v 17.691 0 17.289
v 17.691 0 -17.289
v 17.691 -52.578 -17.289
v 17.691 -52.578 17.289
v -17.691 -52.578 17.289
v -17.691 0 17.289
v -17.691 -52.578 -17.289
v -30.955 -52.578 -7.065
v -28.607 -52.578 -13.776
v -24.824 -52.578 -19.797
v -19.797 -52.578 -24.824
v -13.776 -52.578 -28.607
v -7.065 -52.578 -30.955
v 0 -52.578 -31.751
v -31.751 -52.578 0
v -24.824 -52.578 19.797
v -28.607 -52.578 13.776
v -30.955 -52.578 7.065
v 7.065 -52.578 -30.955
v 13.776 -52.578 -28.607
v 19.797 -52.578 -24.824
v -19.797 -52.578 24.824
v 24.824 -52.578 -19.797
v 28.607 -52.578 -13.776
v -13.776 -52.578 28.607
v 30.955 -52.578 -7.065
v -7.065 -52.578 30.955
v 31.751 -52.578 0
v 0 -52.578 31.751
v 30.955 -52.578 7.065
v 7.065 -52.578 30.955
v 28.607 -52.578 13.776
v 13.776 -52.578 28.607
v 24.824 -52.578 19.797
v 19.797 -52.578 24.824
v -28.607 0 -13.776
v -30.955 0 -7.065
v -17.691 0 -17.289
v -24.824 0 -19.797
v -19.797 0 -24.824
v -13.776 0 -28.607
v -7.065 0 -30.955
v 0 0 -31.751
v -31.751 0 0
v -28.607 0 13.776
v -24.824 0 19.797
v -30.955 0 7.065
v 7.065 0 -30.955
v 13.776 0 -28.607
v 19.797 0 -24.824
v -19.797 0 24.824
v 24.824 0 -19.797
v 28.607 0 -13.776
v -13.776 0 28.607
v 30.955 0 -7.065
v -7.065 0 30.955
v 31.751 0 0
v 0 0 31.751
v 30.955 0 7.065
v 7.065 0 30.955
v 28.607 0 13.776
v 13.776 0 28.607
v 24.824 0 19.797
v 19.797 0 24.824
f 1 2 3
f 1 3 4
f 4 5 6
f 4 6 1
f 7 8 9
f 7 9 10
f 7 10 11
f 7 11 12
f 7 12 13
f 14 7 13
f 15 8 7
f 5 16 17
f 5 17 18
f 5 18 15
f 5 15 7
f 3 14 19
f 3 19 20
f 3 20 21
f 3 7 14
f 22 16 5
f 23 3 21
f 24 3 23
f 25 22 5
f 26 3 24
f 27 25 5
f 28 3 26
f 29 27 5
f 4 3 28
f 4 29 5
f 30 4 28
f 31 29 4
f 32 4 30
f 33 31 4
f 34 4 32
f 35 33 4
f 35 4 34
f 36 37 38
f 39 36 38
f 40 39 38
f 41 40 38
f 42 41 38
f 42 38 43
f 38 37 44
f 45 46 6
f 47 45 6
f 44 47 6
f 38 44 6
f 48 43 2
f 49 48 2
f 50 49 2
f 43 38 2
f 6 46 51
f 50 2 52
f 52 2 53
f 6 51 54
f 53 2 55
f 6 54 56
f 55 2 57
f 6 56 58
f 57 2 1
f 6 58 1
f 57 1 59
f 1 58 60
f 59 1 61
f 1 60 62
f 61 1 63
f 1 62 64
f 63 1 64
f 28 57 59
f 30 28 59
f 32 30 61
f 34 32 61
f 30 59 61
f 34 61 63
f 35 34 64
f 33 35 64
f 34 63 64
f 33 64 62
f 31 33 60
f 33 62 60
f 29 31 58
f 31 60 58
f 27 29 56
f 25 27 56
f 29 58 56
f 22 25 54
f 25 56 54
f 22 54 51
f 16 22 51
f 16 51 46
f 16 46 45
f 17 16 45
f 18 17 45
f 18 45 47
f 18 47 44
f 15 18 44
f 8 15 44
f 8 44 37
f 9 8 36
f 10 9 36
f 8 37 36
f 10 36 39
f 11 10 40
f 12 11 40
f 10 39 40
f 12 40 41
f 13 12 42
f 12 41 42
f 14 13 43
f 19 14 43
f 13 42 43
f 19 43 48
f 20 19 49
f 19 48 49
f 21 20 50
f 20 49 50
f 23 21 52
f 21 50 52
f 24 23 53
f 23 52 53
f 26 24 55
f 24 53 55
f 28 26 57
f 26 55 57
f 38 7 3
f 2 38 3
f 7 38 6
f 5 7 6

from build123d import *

# Parameters (mm, degrees)
F0_R     = 31.751454
F1_DEPTH = 52.578
F2_W     = 35.38131
F2_H     = 34.577188
F3_DEPTH = 141.478


with BuildPart() as f1:
    # F0 (on Front) → F1 (new body)
    with BuildSketch(Plane.XZ):
        Circle(F0_R)
    extrude(amount=F1_DEPTH)

    # F2 (on face) + F0 (on Front) → F3 (cut)
    with BuildSketch(Plane.XZ.offset(52.578)):
        Rectangle(F2_W, F2_H)
    with BuildSketch(Plane.XZ):
        Circle(F0_R)
    extrude(amount=-F3_DEPTH, mode=Mode.SUBTRACT)


solid = f1.part
